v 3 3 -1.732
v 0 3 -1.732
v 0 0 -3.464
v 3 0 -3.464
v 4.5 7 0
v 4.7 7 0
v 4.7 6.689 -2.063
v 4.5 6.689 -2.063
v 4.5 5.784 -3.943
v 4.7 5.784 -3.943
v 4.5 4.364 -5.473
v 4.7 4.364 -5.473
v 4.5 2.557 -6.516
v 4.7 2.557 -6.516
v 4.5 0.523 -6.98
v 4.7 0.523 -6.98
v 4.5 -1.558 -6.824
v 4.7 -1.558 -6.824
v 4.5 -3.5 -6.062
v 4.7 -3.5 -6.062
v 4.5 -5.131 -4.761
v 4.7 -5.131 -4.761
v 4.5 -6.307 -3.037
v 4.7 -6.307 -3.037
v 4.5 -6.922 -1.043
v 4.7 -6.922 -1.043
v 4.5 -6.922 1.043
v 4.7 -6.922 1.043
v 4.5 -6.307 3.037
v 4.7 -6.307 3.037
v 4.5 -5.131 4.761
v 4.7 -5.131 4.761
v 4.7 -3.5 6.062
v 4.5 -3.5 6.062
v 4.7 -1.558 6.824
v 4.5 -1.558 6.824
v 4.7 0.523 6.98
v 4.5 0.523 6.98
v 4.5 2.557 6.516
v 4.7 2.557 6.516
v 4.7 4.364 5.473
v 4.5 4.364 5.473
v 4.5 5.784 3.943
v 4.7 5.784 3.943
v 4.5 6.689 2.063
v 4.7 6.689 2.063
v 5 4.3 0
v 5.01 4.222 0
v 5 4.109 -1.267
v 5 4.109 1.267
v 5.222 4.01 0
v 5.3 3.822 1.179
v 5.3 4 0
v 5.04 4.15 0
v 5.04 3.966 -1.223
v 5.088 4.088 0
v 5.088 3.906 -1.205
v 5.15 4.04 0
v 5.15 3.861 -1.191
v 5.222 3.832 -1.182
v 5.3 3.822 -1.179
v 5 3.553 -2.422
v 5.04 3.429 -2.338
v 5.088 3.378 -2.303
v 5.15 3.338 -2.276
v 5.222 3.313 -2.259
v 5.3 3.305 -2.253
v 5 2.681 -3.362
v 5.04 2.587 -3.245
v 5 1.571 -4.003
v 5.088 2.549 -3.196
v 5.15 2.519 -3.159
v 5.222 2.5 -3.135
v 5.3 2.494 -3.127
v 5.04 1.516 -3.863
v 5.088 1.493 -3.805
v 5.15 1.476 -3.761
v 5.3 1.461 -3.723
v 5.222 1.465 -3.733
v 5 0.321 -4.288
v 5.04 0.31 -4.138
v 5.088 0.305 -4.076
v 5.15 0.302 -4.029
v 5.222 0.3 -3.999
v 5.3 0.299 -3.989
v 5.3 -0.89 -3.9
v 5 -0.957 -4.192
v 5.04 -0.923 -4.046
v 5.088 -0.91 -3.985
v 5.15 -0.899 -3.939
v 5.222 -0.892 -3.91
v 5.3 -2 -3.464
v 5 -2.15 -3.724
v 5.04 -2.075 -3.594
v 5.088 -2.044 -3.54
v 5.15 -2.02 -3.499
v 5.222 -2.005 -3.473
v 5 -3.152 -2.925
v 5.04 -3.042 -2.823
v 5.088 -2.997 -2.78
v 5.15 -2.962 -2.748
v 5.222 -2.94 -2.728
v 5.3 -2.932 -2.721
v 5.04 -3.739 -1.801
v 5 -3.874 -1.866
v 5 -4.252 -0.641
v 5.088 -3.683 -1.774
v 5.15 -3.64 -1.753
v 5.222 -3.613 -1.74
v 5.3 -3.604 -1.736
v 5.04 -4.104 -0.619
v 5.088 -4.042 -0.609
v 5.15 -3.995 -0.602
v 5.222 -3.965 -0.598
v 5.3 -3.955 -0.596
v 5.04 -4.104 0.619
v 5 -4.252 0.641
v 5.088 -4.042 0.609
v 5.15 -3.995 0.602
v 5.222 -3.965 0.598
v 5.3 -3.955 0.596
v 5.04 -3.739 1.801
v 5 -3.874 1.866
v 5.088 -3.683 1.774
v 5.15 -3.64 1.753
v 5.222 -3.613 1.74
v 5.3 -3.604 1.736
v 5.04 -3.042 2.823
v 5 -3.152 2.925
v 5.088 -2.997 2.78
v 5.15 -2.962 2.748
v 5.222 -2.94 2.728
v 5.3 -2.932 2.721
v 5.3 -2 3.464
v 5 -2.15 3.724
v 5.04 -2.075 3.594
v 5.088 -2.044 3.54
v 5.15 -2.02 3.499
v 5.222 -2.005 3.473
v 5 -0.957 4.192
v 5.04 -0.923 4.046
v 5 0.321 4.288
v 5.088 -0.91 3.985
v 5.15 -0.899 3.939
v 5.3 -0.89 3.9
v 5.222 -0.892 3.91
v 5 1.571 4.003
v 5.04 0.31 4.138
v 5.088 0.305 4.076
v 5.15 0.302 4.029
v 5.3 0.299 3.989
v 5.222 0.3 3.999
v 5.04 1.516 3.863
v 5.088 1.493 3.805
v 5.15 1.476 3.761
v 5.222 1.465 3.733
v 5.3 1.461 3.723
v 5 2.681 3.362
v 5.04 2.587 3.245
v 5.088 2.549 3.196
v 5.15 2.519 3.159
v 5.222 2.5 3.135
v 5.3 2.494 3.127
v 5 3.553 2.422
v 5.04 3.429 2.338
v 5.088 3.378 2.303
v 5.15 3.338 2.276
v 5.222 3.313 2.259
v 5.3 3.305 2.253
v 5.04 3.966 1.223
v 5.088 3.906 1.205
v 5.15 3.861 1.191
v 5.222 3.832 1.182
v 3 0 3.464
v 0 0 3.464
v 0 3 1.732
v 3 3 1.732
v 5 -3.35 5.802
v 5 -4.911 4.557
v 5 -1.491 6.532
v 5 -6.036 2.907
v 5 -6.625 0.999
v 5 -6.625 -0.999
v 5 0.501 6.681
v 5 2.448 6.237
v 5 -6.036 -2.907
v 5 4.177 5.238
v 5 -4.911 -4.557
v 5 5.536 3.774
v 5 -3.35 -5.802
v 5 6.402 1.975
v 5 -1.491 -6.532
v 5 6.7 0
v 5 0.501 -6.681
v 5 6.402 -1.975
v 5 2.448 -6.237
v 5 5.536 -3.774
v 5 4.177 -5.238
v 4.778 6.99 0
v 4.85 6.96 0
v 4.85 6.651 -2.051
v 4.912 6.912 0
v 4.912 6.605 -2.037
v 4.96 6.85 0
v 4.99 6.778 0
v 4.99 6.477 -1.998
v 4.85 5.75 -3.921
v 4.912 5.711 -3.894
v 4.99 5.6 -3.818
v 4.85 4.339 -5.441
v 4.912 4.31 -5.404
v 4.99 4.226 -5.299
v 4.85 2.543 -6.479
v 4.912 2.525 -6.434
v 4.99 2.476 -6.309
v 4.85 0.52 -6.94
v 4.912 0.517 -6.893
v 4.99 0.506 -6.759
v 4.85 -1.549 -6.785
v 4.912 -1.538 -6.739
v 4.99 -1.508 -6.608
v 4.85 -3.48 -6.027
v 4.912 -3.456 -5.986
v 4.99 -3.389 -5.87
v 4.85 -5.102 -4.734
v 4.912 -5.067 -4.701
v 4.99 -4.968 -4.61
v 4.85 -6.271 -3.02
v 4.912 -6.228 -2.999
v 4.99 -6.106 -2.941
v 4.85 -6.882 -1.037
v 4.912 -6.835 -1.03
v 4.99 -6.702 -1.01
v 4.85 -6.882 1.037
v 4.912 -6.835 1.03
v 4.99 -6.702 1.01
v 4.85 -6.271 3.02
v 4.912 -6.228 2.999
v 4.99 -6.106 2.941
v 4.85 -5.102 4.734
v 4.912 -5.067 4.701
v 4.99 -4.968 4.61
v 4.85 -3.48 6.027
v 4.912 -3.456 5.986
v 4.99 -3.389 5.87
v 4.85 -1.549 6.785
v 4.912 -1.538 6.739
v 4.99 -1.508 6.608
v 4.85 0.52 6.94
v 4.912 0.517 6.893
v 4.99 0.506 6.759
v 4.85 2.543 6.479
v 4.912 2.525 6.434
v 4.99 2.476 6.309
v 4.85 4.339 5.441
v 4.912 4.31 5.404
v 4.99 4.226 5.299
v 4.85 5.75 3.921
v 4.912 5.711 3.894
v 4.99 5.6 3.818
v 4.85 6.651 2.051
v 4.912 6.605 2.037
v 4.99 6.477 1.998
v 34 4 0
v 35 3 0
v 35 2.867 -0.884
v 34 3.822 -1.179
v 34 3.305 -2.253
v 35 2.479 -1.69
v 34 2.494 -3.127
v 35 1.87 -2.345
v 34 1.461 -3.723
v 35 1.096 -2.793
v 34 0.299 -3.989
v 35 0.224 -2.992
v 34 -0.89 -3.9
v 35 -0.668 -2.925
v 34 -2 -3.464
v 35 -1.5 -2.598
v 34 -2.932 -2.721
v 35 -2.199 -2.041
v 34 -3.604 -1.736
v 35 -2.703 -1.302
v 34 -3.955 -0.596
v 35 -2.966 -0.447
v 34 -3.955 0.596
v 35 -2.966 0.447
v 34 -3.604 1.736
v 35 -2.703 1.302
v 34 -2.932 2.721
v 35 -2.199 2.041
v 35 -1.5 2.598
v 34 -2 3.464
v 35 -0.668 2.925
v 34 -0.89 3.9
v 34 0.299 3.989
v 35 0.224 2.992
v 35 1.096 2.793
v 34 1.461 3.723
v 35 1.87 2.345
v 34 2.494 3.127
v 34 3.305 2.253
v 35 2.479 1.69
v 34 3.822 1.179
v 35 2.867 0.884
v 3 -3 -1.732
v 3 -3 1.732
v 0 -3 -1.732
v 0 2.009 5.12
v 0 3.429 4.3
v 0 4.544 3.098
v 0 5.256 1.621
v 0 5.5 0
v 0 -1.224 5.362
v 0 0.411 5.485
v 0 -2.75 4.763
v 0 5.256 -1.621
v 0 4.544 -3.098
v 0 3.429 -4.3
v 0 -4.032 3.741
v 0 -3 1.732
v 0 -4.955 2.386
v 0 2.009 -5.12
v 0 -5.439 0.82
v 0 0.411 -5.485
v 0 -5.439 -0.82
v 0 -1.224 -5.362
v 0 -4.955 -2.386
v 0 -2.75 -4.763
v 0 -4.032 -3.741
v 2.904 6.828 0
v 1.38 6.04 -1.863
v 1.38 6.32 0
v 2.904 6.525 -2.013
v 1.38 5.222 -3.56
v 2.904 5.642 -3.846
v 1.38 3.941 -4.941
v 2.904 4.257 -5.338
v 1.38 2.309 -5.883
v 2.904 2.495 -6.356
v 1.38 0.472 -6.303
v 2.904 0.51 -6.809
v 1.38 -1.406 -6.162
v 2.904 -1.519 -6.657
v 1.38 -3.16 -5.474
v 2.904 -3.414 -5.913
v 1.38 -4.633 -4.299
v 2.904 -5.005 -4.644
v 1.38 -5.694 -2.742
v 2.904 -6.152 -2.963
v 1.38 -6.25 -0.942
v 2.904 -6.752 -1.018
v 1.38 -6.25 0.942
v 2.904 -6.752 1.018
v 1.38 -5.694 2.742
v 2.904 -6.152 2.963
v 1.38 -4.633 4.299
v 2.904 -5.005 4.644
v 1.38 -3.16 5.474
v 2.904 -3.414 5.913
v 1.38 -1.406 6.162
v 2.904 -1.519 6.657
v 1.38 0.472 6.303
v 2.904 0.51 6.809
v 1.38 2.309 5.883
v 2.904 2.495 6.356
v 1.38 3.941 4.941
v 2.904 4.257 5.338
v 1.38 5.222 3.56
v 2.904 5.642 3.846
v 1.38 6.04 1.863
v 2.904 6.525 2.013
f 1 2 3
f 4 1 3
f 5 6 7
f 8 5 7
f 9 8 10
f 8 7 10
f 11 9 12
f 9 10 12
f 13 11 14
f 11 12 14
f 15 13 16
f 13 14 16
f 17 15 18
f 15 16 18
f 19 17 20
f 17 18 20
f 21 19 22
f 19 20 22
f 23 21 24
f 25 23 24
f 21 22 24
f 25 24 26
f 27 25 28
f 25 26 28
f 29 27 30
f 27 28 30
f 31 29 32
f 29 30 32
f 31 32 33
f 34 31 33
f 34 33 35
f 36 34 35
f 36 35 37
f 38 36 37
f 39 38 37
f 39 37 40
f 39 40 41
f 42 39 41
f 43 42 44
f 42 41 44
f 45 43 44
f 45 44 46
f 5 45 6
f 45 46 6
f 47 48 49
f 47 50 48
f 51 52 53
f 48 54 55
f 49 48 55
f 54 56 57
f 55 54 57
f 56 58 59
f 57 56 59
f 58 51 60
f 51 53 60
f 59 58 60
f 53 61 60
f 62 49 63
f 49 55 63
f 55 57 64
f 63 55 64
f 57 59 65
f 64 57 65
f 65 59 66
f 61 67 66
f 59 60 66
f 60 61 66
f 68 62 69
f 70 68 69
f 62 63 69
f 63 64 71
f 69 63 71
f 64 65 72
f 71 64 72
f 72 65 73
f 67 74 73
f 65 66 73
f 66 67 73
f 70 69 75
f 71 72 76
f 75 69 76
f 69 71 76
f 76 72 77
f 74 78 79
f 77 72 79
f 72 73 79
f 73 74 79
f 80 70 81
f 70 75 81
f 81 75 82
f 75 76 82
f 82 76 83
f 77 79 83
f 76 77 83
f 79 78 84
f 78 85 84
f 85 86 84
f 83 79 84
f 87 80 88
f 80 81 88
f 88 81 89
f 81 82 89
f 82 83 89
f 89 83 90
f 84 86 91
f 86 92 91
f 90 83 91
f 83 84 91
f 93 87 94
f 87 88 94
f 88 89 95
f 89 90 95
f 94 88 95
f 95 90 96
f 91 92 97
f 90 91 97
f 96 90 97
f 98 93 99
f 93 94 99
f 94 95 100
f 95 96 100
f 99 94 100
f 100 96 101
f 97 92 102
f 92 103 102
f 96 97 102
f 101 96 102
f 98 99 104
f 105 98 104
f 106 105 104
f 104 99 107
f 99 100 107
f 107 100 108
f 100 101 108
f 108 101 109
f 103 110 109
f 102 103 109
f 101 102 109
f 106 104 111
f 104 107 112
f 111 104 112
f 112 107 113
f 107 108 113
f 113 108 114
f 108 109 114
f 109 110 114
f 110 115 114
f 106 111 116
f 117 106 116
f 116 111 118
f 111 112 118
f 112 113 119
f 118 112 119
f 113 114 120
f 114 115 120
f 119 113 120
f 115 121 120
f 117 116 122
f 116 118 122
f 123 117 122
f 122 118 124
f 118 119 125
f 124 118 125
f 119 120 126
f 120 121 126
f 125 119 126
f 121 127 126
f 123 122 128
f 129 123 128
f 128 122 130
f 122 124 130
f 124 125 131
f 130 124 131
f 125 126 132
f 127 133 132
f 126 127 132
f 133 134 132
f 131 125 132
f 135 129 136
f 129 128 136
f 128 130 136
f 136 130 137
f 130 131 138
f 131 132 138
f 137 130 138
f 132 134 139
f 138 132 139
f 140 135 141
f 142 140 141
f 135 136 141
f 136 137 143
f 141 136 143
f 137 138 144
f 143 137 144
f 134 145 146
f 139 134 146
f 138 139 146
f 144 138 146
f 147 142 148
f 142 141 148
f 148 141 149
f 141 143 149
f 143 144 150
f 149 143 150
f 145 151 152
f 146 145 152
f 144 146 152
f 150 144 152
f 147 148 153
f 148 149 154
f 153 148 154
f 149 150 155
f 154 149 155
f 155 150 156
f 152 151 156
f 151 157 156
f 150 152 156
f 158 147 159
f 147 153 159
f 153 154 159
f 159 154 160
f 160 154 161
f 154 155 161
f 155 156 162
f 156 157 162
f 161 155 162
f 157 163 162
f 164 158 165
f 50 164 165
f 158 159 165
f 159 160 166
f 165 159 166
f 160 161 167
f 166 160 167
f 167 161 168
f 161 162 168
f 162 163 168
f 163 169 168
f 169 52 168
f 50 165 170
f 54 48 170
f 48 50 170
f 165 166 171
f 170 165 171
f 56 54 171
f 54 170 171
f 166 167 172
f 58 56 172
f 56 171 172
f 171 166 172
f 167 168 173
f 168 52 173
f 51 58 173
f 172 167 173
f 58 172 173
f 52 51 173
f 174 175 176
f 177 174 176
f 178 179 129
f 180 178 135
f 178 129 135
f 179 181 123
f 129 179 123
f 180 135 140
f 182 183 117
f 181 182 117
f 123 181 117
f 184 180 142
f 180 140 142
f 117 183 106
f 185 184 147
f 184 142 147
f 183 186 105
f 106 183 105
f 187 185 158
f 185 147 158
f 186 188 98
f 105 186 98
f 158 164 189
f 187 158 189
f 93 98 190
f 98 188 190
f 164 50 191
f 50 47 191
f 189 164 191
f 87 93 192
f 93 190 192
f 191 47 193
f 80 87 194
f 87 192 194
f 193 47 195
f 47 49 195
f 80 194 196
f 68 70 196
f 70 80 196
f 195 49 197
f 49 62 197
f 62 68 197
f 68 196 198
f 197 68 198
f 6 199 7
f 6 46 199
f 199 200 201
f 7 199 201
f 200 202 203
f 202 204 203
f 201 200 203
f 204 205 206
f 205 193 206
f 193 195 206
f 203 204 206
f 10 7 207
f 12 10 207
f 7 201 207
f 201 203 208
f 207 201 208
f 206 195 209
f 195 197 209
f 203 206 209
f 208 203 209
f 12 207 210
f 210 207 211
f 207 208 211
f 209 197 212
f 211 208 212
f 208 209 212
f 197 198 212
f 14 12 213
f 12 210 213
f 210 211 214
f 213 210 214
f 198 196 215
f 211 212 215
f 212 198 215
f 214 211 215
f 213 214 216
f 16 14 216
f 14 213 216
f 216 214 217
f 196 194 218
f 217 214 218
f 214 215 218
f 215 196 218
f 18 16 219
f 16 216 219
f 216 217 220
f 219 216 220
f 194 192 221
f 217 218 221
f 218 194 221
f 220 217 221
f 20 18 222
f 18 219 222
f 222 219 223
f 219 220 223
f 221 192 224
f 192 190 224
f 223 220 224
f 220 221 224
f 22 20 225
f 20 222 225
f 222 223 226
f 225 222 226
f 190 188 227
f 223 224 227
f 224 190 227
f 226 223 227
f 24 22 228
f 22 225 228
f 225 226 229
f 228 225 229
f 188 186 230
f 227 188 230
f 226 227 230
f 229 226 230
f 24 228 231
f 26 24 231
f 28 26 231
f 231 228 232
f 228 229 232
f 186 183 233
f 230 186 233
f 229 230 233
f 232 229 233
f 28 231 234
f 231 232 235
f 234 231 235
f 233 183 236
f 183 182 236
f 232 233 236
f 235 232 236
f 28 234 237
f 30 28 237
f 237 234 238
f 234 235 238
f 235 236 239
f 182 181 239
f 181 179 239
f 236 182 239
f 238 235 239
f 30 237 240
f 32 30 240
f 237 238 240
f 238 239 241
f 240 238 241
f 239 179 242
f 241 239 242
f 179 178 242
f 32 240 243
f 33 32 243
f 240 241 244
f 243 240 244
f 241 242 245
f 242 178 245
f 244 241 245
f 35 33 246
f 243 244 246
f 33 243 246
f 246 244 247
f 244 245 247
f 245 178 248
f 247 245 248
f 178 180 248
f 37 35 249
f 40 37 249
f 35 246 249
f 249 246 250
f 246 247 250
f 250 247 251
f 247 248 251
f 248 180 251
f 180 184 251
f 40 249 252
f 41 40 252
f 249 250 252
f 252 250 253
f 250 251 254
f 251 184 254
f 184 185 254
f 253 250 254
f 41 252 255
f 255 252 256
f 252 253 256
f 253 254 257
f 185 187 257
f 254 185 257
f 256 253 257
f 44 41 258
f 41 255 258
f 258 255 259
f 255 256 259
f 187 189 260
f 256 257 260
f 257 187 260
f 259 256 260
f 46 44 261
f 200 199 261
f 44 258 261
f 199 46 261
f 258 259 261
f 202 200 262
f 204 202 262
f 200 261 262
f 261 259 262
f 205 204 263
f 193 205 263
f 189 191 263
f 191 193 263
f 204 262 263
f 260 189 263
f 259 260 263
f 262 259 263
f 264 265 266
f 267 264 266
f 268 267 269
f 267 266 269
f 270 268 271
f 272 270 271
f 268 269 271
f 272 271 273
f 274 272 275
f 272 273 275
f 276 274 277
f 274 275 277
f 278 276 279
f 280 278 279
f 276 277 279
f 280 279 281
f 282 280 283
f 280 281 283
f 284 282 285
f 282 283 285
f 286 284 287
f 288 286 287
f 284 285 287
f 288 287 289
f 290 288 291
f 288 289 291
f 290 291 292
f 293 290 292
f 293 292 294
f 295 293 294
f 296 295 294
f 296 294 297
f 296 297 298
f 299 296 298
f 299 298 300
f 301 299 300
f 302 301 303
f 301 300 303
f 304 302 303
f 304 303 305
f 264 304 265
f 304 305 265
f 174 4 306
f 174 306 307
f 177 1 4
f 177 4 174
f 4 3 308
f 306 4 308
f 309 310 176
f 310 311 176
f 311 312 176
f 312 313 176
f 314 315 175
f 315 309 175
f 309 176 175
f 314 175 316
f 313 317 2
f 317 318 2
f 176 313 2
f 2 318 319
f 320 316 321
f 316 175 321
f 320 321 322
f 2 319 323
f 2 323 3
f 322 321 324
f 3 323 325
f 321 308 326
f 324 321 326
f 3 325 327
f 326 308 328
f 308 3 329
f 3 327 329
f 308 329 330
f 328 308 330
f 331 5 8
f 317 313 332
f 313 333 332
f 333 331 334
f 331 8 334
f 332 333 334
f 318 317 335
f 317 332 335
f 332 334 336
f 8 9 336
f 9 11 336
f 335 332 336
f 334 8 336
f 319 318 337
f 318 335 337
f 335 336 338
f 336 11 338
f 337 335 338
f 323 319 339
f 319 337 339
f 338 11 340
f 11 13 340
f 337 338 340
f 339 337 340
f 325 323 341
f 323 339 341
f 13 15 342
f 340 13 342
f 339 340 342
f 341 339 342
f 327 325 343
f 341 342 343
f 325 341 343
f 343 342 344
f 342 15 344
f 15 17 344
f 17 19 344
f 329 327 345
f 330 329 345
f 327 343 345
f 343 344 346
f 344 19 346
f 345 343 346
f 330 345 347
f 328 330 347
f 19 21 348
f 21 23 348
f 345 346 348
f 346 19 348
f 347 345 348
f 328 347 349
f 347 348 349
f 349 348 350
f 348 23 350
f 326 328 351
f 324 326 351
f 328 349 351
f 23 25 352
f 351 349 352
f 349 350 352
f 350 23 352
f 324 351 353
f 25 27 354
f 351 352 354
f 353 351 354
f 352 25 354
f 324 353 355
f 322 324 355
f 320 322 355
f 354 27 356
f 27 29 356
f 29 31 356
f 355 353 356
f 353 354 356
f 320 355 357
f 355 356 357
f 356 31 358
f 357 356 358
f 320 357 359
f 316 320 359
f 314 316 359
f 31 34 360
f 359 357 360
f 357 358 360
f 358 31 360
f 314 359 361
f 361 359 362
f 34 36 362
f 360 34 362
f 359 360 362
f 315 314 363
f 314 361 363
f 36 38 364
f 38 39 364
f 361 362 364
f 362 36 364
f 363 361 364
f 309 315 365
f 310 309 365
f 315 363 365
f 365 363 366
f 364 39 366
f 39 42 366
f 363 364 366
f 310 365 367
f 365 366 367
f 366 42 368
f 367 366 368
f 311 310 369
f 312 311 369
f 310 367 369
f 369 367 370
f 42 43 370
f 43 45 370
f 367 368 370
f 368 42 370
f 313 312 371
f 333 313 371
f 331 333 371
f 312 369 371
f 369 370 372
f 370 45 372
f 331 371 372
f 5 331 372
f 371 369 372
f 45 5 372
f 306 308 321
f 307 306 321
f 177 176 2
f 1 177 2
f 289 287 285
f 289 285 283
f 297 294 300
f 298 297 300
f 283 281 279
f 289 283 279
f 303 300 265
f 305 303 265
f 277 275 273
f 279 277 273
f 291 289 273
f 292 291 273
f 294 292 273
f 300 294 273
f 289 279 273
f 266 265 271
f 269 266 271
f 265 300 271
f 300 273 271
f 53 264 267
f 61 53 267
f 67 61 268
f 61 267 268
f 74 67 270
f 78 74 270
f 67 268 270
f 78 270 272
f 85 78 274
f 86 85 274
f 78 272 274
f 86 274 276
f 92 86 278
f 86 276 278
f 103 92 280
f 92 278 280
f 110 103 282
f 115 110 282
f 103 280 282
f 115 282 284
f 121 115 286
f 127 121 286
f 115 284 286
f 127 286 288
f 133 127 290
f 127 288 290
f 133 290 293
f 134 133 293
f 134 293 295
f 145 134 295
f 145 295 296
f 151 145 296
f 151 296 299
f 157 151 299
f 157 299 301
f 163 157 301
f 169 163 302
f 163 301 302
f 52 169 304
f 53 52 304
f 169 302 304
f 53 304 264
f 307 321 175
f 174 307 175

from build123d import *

# Parameters (mm, degrees)
CUT_EXTRUDE_1_DEPTH = 3
FILLET_1_R          = 0.3
CHAMFER_1_SIZE      = 1


with BuildPart() as part:
    # Эскиз1 → Повернуть1 (revolve)
    with BuildSketch(Plane.XY):
        with BuildLine():
            Line((0, 0), (0, 5.5))
            ThreePointArc((0, 5.5), (2.128291755, 6.615124735), (4.5, 7))
            Line((4.5, 7), (5, 7))
            Line((5, 7), (5, 4))
            Line((5, 4), (35, 4))
            Line((35, 4), (35, 0))
            Line((35, 0), (0, 0))
        make_face()
    revolve(axis=Axis((35, 0, 0), (-1, 0, 0)))

    # Эскиз2 → Вырез-Вытянуть1 (cut)
    with BuildSketch(Plane.ZY):
        Polygon((1.732050808, 3), (-1.732050808, 3), (-3.464101615, 0), (-1.732050808, -3), (1.732050808, -3), (3.464101615, 0), align=None)
    extrude(amount=-CUT_EXTRUDE_1_DEPTH, mode=Mode.SUBTRACT)

    # Скругление1
    fillet_1_edges = [part.edges().sort_by_distance(p)[0] for p in [
        (5, -4, 0),
        (5, -7, 0),
    ]]
    fillet(fillet_1_edges, radius=FILLET_1_R)

    # Фаска1
    chamfer_1_edges = [part.edges().sort_by_distance(p)[0] for p in [
        (35, -4, 0),
    ]]
    chamfer(chamfer_1_edges, length=CHAMFER_1_SIZE)


solid = part.part
